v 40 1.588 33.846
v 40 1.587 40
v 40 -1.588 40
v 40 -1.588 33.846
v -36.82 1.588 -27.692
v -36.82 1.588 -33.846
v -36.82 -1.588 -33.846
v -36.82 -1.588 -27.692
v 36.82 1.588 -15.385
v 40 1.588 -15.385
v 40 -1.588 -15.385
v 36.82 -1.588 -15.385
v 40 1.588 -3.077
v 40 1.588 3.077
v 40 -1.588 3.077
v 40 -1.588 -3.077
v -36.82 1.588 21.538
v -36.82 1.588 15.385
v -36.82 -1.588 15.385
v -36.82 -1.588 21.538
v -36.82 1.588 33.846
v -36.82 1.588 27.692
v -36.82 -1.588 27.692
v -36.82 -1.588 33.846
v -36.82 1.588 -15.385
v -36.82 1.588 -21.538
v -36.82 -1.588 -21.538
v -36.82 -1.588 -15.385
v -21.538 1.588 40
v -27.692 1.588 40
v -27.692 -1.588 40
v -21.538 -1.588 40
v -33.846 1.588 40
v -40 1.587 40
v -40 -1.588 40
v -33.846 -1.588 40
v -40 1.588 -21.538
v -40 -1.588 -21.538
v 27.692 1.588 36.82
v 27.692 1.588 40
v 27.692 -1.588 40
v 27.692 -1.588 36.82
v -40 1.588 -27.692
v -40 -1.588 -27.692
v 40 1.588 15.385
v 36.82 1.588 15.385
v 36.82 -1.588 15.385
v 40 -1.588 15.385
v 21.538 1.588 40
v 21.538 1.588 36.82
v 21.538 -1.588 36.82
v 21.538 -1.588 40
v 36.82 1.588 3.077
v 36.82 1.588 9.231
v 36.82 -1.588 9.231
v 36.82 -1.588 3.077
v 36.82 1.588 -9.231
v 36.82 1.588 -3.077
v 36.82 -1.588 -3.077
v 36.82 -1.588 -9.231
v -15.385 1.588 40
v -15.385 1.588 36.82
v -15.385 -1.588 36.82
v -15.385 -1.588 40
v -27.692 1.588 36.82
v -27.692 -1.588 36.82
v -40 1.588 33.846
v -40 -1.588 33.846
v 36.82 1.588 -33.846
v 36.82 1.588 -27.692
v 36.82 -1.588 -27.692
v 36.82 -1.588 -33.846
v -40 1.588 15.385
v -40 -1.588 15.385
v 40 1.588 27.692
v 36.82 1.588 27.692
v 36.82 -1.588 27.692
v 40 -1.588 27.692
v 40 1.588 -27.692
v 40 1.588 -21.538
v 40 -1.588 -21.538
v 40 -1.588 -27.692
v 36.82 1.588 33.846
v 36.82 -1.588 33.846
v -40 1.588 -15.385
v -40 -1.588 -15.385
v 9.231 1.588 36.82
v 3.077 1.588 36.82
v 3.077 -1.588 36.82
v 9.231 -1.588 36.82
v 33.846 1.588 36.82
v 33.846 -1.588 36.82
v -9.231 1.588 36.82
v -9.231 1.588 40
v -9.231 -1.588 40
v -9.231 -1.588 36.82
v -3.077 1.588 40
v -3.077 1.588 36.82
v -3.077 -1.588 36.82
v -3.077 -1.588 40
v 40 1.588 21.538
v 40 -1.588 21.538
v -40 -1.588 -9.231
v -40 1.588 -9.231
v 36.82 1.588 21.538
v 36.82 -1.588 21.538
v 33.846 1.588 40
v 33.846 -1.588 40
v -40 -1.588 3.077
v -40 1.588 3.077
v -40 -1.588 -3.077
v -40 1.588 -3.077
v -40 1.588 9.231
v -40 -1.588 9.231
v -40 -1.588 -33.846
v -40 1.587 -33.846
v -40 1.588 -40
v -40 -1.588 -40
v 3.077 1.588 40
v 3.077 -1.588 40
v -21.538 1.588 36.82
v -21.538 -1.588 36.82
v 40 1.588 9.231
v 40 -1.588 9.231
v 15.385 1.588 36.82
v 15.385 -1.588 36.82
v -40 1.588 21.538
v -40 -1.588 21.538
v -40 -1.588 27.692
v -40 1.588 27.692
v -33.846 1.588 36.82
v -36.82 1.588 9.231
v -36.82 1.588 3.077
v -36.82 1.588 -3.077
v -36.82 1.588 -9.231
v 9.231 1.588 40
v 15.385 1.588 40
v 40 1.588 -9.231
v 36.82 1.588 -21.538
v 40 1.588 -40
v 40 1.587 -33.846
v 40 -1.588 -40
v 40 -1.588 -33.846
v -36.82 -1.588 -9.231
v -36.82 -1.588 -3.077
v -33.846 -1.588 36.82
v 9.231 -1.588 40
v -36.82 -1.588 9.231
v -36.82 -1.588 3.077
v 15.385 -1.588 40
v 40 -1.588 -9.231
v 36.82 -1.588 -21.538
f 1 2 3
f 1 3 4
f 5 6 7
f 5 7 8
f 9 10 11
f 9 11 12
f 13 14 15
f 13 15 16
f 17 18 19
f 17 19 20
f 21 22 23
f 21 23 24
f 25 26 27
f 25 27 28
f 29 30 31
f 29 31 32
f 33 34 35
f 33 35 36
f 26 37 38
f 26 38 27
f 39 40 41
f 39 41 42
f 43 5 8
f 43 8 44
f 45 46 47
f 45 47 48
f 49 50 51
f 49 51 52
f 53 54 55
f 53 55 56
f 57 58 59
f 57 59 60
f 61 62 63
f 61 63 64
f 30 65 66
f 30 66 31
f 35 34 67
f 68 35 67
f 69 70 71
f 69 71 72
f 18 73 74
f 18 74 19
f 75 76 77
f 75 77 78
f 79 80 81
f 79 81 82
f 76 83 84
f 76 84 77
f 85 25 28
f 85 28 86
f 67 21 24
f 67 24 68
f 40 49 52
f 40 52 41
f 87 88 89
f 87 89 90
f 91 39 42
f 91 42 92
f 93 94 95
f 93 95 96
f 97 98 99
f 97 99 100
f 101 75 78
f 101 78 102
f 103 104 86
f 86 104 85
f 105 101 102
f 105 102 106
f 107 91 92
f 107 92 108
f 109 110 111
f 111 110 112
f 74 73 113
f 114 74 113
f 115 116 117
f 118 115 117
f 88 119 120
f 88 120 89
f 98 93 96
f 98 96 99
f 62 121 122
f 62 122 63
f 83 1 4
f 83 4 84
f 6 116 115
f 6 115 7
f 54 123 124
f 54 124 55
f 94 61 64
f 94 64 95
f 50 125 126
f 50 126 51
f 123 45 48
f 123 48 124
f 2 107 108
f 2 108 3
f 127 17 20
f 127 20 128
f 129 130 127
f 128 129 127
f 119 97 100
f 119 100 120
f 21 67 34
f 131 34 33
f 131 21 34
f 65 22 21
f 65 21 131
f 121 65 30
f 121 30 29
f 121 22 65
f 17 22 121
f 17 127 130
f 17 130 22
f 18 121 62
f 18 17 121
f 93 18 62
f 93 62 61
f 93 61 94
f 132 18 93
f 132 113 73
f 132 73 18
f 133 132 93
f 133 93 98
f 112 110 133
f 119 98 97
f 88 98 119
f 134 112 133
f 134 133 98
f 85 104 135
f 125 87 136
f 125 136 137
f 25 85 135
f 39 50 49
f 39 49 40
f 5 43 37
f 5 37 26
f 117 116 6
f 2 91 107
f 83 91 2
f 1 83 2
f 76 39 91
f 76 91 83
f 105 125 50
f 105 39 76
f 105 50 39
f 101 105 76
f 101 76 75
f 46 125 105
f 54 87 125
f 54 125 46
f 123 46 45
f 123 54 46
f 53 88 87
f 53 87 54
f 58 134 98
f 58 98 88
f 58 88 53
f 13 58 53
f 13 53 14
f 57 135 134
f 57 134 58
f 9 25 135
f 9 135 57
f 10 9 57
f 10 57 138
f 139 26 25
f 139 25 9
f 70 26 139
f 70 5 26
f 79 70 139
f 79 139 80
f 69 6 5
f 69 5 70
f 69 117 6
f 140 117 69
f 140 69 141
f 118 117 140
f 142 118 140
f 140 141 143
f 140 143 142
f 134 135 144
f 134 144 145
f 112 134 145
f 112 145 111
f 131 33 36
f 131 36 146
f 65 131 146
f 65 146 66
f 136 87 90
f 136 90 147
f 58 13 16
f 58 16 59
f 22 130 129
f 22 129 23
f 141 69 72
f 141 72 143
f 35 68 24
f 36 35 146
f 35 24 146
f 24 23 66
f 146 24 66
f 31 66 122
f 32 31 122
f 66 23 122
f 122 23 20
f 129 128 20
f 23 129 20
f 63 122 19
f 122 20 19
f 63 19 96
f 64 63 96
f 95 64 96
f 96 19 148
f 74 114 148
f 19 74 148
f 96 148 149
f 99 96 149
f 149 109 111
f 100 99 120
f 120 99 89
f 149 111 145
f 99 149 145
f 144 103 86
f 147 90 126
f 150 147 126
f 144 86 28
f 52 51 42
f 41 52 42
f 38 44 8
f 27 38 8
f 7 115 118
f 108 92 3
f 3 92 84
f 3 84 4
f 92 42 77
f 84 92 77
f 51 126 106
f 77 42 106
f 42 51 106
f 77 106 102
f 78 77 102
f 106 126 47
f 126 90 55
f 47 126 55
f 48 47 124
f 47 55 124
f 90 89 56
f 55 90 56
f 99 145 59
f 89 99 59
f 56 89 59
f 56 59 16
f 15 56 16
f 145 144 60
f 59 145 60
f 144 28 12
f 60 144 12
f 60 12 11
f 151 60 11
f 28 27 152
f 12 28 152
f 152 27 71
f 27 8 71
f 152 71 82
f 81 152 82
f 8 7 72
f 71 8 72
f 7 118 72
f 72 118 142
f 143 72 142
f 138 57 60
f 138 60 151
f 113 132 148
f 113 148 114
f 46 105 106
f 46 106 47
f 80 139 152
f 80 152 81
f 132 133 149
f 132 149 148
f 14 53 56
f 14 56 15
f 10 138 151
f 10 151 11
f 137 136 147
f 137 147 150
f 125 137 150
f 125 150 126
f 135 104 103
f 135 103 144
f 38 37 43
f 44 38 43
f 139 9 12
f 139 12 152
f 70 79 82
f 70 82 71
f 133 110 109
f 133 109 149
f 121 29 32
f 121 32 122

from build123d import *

# Parameters (mm, degrees)
SKETCH1_W           = 80
SKETCH1_H           = 80
BOSS_EXTRUDE1_DEPTH = 1.5875
SKETCH2_OUTSIDE_W   = 104.636
SKETCH2_OUTSIDE_H   = 104.636
CUT_EXTRUDE1_DEPTH  = 57.657573413
SKETCH3_W           = 80
SKETCH3_H           = 6.153846154
BOSS_EXTRUDE2_DEPTH = 3.175


with BuildPart() as part:
    # Sketch1 → Boss-Extrude1 (new, symmetric)
    with BuildSketch(Plane(origin=(0, 0, 0), x_dir=(1, 0, 0), z_dir=(0, 1, 0))):
        Rectangle(SKETCH1_W, SKETCH1_H)
    extrude(amount=BOSS_EXTRUDE1_DEPTH, both=True)

    # Sketch2 outside → Cut-Extrude1 (cut, through all)
    with BuildSketch(Plane(origin=(0, 1.5875, 0), x_dir=(1, 0, 0), z_dir=(0, 1, 0))):
        Rectangle(SKETCH2_OUTSIDE_W, SKETCH2_OUTSIDE_H)
        Polygon((-40, 40), (-40, 33.846153846), (-36.82, 33.846153846), (-36.82, 27.692307692), (-40, 27.692307692), (-40, 21.538461538), (-36.82, 21.538461538), (-36.82, 15.384615385), (-40, 15.384615385), (-40, 9.230769231), (-36.82, 9.230769231), (-36.82, 3.076923077), (-40, 3.076923077), (-40, -3.076923077), (-36.82, -3.076923077), (-36.82, -9.230769231), (-40, -9.230769231), (-40, -15.384615385), (-36.82, -15.384615385), (-36.82, -21.538461538), (-40, -21.538461538), (-40, -27.692307692), (-36.82, -27.692307692), (-36.82, -33.846153846), (-40, -33.846153846), (-40, -40), (-33.846153846, -40), (-33.846153846, -36.82), (-27.692307692, -36.82), (-27.692307692, -40), (-21.538461538, -40), (-21.538461538, -36.82), (-15.384615385, -36.82), (-15.384615385, -40), (-9.230769231, -40), (-9.230769231, -36.82), (-3.076923077, -36.82), (-3.076923077, -40), (3.076923077, -40), (3.076923077, -36.82), (9.230769231, -36.82), (9.230769231, -40), (15.384615385, -40), (15.384615385, -36.82), (21.538461538, -36.82), (21.538461538, -40), (27.692307692, -40), (27.692307692, -36.82), (33.846153846, -36.82), (33.846153846, -40), (40, -40), (40, -33.846153846), (36.82, -33.846153846), (36.82, -27.692307692), (40, -27.692307692), (40, -21.538461538), (36.82, -21.538461538), (36.82, -15.384615385), (40, -15.384615385), (40, -9.230769231), (36.82, -9.230769231), (36.82, -3.076923077), (40, -3.076923077), (40, 3.076923077), (36.82, 3.076923077), (36.82, 9.230769231), (40, 9.230769231), (40, 15.384615385), (36.82, 15.384615385), (36.82, 21.538461538), (40, 21.538461538), (40, 27.692307692), (36.82, 27.692307692), (36.82, 33.846153846), (40, 33.846153846), (40, 40), (33.846153846, 40), (33.846153846, 36.82), (27.692307692, 36.82), (27.692307692, 40), (21.538461538, 40), (21.538461538, 36.82), (15.384615385, 36.82), (15.384615385, 40), (9.230769231, 40), (9.230769231, 36.82), (3.076923077, 36.82), (3.076923077, 40), (-3.076923077, 40), (-3.076923077, 36.82), (-9.230769231, 36.82), (-9.230769231, 40), (-15.384615385, 40), (-15.384615385, 36.82), (-21.538461538, 36.82), (-21.538461538, 40), (-27.692307692, 40), (-27.692307692, 36.82), (-33.846153846, 36.82), (-33.846153846, 40), align=None, mode=Mode.SUBTRACT)
    extrude(amount=-CUT_EXTRUDE1_DEPTH, mode=Mode.SUBTRACT)

    # Sketch3 → Boss-Extrude2 (add)
    with BuildSketch(Plane(origin=(0, 1.5875, 0), x_dir=(1, 0, 0), z_dir=(0, 1, 0))):
        with Locations((0, 36.923076923)):
            Rectangle(SKETCH3_W, SKETCH3_H)
    extrude(amount=-BOSS_EXTRUDE2_DEPTH)


solid = part.part
